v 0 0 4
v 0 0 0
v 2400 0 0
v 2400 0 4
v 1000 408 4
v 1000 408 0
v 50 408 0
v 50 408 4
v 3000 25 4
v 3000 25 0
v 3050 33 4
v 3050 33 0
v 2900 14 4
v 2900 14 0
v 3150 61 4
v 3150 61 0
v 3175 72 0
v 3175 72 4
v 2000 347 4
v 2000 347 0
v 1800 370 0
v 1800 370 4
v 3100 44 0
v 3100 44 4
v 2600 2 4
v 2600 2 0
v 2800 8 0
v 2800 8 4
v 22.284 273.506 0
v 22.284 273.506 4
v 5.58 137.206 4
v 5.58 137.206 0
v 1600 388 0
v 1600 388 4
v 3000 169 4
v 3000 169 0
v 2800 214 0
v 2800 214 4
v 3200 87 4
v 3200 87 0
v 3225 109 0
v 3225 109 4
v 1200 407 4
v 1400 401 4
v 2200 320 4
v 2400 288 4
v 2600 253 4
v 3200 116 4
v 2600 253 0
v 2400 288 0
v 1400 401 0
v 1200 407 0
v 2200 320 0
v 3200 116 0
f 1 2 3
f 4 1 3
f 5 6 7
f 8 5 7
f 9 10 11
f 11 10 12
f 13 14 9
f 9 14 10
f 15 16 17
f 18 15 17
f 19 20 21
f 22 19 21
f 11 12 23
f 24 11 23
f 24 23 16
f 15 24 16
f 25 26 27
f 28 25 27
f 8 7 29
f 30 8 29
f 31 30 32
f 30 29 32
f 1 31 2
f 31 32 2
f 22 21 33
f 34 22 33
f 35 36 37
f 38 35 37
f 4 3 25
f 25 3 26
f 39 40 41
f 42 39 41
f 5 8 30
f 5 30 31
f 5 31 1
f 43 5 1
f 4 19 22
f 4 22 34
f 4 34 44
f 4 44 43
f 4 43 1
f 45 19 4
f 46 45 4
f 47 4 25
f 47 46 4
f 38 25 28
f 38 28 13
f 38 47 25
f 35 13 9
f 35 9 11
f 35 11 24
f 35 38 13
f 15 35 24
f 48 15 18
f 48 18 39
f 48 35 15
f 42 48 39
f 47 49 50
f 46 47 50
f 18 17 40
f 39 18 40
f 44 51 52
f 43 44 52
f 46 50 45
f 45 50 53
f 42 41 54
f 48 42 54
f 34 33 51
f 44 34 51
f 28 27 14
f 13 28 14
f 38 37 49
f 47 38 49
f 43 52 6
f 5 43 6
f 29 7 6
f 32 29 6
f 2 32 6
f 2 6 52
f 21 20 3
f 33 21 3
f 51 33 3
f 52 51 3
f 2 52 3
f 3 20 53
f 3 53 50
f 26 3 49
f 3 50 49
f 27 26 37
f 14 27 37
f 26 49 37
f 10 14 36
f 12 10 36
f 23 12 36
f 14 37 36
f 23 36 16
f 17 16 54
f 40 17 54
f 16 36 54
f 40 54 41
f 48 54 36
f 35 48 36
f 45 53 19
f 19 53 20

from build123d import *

# Parameters (mm, degrees)
F1_DEPTH = 4


with BuildPart() as f1:
    # F0 (on Top) → F1 (new body)
    with BuildSketch(Plane.XY):
        with BuildLine():
            ThreePointArc((50, 408), (12.546583, 205.526154), (0, 0))
            Line((0, 0), (1000, 0))
            Line((1000, 0), (1000, 408))
            Line((1000, 408), (50, 408))
        make_face()
        Polygon((1000, 408), (1000, 0), (1200, 0), (1200, 407), align=None)
        Polygon((1200, 407), (1200, 0), (1400, 0), (1400, 401), align=None)
        Polygon((1400, 401), (1400, 0), (1600, 0), (1600, 76), (1600, 388), align=None)
        Polygon((1600, 76), (1600, 0), (1800, 0), (1800, 370), (1600, 388), align=None)
        Polygon((1800, 370), (1800, 0), (2000, 0), (2000, 347), align=None)
        Polygon((2000, 347), (2000, 0), (2200, 0), (2200, 320), align=None)
        Polygon((2200, 320), (2200, 0), (2400, 0), (2400, 288), align=None)
        Polygon((2400, 288), (2400, 0), (2600, 2), (2600, 253), align=None)
        Polygon((2600, 253), (2600, 2), (2800, 8), (2800, 214), align=None)
        Polygon((2800, 214), (2800, 8), (2900, 14), (3000, 25), (3000, 169), align=None)
        Polygon((3200, 116), (3000, 169), (3000, 25), (3050, 33), (3100, 44), (3150, 61), (3175, 72), (3200, 87), align=None)
        Polygon((3225, 109), (3200, 116), (3200, 87), align=None)
    extrude(amount=F1_DEPTH)


solid = f1.part
